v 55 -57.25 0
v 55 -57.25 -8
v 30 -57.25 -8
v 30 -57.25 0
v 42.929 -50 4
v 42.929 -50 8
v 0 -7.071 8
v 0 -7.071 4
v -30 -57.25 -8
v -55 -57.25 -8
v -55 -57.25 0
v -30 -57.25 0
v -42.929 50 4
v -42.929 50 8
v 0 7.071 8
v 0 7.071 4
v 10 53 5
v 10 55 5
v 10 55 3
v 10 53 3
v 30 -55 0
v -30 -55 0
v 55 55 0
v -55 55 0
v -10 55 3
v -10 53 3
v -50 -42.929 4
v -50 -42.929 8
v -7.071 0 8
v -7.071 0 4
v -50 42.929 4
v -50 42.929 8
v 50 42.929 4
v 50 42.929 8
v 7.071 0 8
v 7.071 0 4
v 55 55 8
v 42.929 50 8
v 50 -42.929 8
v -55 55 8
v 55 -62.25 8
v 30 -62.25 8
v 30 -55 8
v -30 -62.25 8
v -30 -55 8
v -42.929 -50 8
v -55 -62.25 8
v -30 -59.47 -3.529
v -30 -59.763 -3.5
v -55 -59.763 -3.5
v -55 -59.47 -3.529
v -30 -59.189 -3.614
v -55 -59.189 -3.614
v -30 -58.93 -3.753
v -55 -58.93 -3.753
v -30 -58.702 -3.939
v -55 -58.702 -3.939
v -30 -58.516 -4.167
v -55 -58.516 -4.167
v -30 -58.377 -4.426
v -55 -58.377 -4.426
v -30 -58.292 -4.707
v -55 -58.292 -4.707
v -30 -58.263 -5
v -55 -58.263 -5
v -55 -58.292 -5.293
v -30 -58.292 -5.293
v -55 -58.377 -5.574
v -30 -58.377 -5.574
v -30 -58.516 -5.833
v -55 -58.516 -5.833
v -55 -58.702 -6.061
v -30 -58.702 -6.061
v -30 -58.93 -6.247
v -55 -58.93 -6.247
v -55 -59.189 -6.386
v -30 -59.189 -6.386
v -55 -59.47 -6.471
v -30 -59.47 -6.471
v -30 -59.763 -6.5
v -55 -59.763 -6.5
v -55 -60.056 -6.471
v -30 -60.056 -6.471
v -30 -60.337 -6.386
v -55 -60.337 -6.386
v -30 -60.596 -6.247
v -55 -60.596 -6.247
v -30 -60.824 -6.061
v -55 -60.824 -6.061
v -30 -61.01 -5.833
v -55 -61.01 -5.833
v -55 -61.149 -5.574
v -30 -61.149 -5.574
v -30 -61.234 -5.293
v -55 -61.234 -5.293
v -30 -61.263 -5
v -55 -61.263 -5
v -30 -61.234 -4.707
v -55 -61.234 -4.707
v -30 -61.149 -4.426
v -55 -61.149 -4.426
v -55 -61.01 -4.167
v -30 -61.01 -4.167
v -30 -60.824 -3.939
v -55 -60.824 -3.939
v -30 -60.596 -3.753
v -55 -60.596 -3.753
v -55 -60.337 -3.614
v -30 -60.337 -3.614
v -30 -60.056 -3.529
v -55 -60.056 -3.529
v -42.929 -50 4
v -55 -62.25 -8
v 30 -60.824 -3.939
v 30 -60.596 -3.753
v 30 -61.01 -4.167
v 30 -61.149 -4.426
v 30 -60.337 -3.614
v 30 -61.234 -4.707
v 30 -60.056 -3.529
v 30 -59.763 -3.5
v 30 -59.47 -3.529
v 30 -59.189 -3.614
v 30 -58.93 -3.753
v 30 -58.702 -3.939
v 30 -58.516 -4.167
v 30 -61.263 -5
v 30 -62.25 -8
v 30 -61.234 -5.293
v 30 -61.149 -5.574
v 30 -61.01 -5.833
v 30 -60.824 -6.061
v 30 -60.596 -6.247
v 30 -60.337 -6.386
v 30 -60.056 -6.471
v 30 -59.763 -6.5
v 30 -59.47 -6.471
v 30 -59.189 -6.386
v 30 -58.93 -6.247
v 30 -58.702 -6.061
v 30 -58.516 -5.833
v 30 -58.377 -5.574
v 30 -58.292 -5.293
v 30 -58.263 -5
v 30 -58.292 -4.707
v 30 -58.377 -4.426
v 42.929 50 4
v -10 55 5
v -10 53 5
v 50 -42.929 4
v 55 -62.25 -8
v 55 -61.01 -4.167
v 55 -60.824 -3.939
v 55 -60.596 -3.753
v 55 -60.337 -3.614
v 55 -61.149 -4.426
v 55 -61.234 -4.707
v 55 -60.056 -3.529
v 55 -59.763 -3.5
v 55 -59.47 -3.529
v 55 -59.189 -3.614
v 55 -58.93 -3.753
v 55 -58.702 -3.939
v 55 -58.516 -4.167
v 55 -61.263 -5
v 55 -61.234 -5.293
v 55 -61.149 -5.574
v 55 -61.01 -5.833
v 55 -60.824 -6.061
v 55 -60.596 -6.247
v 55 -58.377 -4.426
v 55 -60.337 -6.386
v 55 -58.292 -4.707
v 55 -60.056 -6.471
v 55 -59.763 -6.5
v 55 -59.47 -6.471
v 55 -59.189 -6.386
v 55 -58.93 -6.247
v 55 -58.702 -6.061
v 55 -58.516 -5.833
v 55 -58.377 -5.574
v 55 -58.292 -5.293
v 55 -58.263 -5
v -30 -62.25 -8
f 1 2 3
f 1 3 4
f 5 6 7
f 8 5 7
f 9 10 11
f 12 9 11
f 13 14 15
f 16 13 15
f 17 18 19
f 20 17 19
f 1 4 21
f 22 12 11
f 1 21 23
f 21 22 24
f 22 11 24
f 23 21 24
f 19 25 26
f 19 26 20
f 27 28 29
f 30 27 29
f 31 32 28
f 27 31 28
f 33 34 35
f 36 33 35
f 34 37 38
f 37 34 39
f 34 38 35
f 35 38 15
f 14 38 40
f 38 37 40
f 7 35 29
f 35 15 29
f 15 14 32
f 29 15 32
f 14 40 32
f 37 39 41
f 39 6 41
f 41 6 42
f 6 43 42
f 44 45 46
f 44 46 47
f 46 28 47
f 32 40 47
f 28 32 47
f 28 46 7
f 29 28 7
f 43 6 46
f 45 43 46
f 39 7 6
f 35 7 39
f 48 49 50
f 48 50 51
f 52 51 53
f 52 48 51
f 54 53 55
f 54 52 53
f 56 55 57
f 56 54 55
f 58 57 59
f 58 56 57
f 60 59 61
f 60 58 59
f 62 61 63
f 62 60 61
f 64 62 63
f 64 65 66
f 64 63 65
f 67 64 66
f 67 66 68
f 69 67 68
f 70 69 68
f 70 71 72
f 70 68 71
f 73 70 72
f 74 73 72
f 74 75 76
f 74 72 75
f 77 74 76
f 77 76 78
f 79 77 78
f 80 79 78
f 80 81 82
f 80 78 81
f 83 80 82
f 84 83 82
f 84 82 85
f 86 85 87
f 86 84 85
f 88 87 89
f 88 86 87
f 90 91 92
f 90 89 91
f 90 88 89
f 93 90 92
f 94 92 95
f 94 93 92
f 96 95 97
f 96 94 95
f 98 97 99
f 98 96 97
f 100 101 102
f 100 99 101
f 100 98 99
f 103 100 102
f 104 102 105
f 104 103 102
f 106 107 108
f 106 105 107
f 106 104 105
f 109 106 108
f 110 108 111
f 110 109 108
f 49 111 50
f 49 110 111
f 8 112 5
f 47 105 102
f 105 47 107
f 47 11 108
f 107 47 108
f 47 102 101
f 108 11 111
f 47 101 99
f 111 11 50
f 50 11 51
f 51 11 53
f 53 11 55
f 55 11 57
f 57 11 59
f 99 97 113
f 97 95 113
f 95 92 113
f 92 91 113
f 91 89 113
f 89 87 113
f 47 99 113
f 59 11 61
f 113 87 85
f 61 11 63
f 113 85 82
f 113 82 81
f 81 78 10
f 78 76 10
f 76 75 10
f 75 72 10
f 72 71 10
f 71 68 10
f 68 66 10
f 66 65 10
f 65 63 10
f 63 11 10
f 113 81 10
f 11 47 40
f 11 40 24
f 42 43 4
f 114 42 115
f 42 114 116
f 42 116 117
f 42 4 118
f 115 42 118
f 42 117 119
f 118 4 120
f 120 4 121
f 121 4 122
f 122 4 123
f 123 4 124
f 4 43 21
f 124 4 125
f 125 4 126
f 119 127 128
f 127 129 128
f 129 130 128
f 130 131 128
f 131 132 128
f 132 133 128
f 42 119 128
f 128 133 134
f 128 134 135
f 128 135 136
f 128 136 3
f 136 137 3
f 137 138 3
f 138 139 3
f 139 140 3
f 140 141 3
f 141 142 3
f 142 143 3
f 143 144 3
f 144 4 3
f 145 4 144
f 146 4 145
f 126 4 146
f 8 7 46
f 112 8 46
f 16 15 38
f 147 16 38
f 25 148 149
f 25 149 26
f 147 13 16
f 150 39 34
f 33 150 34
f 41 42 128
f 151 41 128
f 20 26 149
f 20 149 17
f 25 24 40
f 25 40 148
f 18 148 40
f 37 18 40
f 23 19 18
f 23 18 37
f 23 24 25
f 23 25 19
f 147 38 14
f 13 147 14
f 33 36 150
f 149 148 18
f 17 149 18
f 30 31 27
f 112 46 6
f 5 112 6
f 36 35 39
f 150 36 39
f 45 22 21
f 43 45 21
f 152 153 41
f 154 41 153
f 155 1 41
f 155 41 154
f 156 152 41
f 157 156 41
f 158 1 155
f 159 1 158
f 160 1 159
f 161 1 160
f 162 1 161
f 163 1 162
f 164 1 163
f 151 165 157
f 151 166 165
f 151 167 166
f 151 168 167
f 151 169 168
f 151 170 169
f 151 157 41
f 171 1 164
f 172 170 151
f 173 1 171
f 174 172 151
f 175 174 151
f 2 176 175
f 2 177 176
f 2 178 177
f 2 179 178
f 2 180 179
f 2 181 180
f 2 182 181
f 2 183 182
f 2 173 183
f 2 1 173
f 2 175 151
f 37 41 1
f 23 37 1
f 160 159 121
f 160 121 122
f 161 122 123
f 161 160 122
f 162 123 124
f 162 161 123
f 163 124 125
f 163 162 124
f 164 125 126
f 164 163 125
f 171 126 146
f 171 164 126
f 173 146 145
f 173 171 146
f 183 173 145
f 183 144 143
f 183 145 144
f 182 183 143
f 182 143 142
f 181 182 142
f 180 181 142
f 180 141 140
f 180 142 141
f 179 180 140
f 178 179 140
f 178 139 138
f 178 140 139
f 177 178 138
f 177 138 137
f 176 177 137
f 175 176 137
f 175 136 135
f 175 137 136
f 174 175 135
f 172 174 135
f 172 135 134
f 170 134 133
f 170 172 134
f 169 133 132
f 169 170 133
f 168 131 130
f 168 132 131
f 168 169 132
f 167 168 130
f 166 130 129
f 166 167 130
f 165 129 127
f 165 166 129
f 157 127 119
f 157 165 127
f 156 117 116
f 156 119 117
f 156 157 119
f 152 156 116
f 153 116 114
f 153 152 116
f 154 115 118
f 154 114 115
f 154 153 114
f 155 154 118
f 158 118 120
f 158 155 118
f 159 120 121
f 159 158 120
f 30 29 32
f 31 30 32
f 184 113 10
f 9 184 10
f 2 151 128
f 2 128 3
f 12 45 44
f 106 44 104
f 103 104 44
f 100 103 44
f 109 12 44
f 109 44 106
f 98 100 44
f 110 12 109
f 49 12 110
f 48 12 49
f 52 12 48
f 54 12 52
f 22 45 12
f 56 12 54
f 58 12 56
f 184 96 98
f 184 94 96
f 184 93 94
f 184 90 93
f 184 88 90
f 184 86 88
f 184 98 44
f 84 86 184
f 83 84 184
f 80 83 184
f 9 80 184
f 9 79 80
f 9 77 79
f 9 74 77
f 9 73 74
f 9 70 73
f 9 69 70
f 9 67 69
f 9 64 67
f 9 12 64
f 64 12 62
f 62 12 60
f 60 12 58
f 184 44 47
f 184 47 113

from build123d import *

# Parameters (mm, degrees)
SKETCH2_W               = 110
SKETCH2_H               = 110
BOSS_EXTRUDE1_DEPTH     = 8
BOSS_EXTRUDE2_DEPTH     = 25
CUT_EXTRUDE1_DEPTH      = 127.645420367
CUT_EXTRUDE1_DEPTH_BACK = 127.645420367
SKETCH10_R              = 1.5
CUT_EXTRUDE2_DEPTH      = 4
SKETCH12_W              = 20
SKETCH12_H              = 2
CUT_EXTRUDE3_DEPTH      = 2


with BuildPart() as part:
    # Sketch2 → Boss-Extrude1 (new body)
    with BuildSketch(Plane.XY):
        Rectangle(SKETCH2_W, SKETCH2_H)
    extrude(amount=BOSS_EXTRUDE1_DEPTH)

    # Sketch8 → Boss-Extrude2 (add)
    with BuildSketch(Plane(origin=(55, 0, 0), x_dir=(0, 0, -1), z_dir=(1, 0, 0))):
        Polygon((-8, -55), (-8, -62.25), (8, -62.25), (8, -57.25), (0, -57.25), (0, -55), align=None)
    boss_extrude2 = extrude(amount=-BOSS_EXTRUDE2_DEPTH)

    # Mirror1: Boss-Extrude2 across plane
    add(boss_extrude2.mirror(Plane(origin=(0, 0, 0), x_dir=(0, 0, 1), z_dir=(1, 0, 0))))

    # Sketch10 → Cut-Extrude1 (cut, two sides: drawn at the far end of the back side and taken through both)
    with BuildSketch(Plane.ZY.offset(55).offset(-CUT_EXTRUDE1_DEPTH_BACK)):
        with Locations((-5, -59.762907668)):
            Circle(SKETCH10_R)
    extrude(amount=CUT_EXTRUDE1_DEPTH + CUT_EXTRUDE1_DEPTH_BACK, mode=Mode.SUBTRACT)

    # Sketch11 → Cut-Extrude2 (cut)
    with BuildSketch(Plane.XY.offset(8)):
        Polygon((-42.928932188, 50), (0, 7.071067812), (42.928932188, 50), align=None)
        Polygon((50, -42.928932188), (50, 42.928932188), (7.071067812, 0), align=None)
        Polygon((-42.928932188, -50), (42.928932188, -50), (0, -7.071067812), align=None)
        Polygon((-50, 42.928932188), (-50, -42.928932188), (-7.071067812, 0), align=None)
    extrude(amount=-CUT_EXTRUDE2_DEPTH, mode=Mode.SUBTRACT)

    # Sketch12 → Cut-Extrude3 (cut)
    with BuildSketch(Plane(origin=(0, 55, 0), x_dir=(1, 0, 0), z_dir=(0, 1, 0))):
        with Locations((0, -4)):
            Rectangle(SKETCH12_W, SKETCH12_H)
    extrude(amount=-CUT_EXTRUDE3_DEPTH, mode=Mode.SUBTRACT)


solid = part.part
